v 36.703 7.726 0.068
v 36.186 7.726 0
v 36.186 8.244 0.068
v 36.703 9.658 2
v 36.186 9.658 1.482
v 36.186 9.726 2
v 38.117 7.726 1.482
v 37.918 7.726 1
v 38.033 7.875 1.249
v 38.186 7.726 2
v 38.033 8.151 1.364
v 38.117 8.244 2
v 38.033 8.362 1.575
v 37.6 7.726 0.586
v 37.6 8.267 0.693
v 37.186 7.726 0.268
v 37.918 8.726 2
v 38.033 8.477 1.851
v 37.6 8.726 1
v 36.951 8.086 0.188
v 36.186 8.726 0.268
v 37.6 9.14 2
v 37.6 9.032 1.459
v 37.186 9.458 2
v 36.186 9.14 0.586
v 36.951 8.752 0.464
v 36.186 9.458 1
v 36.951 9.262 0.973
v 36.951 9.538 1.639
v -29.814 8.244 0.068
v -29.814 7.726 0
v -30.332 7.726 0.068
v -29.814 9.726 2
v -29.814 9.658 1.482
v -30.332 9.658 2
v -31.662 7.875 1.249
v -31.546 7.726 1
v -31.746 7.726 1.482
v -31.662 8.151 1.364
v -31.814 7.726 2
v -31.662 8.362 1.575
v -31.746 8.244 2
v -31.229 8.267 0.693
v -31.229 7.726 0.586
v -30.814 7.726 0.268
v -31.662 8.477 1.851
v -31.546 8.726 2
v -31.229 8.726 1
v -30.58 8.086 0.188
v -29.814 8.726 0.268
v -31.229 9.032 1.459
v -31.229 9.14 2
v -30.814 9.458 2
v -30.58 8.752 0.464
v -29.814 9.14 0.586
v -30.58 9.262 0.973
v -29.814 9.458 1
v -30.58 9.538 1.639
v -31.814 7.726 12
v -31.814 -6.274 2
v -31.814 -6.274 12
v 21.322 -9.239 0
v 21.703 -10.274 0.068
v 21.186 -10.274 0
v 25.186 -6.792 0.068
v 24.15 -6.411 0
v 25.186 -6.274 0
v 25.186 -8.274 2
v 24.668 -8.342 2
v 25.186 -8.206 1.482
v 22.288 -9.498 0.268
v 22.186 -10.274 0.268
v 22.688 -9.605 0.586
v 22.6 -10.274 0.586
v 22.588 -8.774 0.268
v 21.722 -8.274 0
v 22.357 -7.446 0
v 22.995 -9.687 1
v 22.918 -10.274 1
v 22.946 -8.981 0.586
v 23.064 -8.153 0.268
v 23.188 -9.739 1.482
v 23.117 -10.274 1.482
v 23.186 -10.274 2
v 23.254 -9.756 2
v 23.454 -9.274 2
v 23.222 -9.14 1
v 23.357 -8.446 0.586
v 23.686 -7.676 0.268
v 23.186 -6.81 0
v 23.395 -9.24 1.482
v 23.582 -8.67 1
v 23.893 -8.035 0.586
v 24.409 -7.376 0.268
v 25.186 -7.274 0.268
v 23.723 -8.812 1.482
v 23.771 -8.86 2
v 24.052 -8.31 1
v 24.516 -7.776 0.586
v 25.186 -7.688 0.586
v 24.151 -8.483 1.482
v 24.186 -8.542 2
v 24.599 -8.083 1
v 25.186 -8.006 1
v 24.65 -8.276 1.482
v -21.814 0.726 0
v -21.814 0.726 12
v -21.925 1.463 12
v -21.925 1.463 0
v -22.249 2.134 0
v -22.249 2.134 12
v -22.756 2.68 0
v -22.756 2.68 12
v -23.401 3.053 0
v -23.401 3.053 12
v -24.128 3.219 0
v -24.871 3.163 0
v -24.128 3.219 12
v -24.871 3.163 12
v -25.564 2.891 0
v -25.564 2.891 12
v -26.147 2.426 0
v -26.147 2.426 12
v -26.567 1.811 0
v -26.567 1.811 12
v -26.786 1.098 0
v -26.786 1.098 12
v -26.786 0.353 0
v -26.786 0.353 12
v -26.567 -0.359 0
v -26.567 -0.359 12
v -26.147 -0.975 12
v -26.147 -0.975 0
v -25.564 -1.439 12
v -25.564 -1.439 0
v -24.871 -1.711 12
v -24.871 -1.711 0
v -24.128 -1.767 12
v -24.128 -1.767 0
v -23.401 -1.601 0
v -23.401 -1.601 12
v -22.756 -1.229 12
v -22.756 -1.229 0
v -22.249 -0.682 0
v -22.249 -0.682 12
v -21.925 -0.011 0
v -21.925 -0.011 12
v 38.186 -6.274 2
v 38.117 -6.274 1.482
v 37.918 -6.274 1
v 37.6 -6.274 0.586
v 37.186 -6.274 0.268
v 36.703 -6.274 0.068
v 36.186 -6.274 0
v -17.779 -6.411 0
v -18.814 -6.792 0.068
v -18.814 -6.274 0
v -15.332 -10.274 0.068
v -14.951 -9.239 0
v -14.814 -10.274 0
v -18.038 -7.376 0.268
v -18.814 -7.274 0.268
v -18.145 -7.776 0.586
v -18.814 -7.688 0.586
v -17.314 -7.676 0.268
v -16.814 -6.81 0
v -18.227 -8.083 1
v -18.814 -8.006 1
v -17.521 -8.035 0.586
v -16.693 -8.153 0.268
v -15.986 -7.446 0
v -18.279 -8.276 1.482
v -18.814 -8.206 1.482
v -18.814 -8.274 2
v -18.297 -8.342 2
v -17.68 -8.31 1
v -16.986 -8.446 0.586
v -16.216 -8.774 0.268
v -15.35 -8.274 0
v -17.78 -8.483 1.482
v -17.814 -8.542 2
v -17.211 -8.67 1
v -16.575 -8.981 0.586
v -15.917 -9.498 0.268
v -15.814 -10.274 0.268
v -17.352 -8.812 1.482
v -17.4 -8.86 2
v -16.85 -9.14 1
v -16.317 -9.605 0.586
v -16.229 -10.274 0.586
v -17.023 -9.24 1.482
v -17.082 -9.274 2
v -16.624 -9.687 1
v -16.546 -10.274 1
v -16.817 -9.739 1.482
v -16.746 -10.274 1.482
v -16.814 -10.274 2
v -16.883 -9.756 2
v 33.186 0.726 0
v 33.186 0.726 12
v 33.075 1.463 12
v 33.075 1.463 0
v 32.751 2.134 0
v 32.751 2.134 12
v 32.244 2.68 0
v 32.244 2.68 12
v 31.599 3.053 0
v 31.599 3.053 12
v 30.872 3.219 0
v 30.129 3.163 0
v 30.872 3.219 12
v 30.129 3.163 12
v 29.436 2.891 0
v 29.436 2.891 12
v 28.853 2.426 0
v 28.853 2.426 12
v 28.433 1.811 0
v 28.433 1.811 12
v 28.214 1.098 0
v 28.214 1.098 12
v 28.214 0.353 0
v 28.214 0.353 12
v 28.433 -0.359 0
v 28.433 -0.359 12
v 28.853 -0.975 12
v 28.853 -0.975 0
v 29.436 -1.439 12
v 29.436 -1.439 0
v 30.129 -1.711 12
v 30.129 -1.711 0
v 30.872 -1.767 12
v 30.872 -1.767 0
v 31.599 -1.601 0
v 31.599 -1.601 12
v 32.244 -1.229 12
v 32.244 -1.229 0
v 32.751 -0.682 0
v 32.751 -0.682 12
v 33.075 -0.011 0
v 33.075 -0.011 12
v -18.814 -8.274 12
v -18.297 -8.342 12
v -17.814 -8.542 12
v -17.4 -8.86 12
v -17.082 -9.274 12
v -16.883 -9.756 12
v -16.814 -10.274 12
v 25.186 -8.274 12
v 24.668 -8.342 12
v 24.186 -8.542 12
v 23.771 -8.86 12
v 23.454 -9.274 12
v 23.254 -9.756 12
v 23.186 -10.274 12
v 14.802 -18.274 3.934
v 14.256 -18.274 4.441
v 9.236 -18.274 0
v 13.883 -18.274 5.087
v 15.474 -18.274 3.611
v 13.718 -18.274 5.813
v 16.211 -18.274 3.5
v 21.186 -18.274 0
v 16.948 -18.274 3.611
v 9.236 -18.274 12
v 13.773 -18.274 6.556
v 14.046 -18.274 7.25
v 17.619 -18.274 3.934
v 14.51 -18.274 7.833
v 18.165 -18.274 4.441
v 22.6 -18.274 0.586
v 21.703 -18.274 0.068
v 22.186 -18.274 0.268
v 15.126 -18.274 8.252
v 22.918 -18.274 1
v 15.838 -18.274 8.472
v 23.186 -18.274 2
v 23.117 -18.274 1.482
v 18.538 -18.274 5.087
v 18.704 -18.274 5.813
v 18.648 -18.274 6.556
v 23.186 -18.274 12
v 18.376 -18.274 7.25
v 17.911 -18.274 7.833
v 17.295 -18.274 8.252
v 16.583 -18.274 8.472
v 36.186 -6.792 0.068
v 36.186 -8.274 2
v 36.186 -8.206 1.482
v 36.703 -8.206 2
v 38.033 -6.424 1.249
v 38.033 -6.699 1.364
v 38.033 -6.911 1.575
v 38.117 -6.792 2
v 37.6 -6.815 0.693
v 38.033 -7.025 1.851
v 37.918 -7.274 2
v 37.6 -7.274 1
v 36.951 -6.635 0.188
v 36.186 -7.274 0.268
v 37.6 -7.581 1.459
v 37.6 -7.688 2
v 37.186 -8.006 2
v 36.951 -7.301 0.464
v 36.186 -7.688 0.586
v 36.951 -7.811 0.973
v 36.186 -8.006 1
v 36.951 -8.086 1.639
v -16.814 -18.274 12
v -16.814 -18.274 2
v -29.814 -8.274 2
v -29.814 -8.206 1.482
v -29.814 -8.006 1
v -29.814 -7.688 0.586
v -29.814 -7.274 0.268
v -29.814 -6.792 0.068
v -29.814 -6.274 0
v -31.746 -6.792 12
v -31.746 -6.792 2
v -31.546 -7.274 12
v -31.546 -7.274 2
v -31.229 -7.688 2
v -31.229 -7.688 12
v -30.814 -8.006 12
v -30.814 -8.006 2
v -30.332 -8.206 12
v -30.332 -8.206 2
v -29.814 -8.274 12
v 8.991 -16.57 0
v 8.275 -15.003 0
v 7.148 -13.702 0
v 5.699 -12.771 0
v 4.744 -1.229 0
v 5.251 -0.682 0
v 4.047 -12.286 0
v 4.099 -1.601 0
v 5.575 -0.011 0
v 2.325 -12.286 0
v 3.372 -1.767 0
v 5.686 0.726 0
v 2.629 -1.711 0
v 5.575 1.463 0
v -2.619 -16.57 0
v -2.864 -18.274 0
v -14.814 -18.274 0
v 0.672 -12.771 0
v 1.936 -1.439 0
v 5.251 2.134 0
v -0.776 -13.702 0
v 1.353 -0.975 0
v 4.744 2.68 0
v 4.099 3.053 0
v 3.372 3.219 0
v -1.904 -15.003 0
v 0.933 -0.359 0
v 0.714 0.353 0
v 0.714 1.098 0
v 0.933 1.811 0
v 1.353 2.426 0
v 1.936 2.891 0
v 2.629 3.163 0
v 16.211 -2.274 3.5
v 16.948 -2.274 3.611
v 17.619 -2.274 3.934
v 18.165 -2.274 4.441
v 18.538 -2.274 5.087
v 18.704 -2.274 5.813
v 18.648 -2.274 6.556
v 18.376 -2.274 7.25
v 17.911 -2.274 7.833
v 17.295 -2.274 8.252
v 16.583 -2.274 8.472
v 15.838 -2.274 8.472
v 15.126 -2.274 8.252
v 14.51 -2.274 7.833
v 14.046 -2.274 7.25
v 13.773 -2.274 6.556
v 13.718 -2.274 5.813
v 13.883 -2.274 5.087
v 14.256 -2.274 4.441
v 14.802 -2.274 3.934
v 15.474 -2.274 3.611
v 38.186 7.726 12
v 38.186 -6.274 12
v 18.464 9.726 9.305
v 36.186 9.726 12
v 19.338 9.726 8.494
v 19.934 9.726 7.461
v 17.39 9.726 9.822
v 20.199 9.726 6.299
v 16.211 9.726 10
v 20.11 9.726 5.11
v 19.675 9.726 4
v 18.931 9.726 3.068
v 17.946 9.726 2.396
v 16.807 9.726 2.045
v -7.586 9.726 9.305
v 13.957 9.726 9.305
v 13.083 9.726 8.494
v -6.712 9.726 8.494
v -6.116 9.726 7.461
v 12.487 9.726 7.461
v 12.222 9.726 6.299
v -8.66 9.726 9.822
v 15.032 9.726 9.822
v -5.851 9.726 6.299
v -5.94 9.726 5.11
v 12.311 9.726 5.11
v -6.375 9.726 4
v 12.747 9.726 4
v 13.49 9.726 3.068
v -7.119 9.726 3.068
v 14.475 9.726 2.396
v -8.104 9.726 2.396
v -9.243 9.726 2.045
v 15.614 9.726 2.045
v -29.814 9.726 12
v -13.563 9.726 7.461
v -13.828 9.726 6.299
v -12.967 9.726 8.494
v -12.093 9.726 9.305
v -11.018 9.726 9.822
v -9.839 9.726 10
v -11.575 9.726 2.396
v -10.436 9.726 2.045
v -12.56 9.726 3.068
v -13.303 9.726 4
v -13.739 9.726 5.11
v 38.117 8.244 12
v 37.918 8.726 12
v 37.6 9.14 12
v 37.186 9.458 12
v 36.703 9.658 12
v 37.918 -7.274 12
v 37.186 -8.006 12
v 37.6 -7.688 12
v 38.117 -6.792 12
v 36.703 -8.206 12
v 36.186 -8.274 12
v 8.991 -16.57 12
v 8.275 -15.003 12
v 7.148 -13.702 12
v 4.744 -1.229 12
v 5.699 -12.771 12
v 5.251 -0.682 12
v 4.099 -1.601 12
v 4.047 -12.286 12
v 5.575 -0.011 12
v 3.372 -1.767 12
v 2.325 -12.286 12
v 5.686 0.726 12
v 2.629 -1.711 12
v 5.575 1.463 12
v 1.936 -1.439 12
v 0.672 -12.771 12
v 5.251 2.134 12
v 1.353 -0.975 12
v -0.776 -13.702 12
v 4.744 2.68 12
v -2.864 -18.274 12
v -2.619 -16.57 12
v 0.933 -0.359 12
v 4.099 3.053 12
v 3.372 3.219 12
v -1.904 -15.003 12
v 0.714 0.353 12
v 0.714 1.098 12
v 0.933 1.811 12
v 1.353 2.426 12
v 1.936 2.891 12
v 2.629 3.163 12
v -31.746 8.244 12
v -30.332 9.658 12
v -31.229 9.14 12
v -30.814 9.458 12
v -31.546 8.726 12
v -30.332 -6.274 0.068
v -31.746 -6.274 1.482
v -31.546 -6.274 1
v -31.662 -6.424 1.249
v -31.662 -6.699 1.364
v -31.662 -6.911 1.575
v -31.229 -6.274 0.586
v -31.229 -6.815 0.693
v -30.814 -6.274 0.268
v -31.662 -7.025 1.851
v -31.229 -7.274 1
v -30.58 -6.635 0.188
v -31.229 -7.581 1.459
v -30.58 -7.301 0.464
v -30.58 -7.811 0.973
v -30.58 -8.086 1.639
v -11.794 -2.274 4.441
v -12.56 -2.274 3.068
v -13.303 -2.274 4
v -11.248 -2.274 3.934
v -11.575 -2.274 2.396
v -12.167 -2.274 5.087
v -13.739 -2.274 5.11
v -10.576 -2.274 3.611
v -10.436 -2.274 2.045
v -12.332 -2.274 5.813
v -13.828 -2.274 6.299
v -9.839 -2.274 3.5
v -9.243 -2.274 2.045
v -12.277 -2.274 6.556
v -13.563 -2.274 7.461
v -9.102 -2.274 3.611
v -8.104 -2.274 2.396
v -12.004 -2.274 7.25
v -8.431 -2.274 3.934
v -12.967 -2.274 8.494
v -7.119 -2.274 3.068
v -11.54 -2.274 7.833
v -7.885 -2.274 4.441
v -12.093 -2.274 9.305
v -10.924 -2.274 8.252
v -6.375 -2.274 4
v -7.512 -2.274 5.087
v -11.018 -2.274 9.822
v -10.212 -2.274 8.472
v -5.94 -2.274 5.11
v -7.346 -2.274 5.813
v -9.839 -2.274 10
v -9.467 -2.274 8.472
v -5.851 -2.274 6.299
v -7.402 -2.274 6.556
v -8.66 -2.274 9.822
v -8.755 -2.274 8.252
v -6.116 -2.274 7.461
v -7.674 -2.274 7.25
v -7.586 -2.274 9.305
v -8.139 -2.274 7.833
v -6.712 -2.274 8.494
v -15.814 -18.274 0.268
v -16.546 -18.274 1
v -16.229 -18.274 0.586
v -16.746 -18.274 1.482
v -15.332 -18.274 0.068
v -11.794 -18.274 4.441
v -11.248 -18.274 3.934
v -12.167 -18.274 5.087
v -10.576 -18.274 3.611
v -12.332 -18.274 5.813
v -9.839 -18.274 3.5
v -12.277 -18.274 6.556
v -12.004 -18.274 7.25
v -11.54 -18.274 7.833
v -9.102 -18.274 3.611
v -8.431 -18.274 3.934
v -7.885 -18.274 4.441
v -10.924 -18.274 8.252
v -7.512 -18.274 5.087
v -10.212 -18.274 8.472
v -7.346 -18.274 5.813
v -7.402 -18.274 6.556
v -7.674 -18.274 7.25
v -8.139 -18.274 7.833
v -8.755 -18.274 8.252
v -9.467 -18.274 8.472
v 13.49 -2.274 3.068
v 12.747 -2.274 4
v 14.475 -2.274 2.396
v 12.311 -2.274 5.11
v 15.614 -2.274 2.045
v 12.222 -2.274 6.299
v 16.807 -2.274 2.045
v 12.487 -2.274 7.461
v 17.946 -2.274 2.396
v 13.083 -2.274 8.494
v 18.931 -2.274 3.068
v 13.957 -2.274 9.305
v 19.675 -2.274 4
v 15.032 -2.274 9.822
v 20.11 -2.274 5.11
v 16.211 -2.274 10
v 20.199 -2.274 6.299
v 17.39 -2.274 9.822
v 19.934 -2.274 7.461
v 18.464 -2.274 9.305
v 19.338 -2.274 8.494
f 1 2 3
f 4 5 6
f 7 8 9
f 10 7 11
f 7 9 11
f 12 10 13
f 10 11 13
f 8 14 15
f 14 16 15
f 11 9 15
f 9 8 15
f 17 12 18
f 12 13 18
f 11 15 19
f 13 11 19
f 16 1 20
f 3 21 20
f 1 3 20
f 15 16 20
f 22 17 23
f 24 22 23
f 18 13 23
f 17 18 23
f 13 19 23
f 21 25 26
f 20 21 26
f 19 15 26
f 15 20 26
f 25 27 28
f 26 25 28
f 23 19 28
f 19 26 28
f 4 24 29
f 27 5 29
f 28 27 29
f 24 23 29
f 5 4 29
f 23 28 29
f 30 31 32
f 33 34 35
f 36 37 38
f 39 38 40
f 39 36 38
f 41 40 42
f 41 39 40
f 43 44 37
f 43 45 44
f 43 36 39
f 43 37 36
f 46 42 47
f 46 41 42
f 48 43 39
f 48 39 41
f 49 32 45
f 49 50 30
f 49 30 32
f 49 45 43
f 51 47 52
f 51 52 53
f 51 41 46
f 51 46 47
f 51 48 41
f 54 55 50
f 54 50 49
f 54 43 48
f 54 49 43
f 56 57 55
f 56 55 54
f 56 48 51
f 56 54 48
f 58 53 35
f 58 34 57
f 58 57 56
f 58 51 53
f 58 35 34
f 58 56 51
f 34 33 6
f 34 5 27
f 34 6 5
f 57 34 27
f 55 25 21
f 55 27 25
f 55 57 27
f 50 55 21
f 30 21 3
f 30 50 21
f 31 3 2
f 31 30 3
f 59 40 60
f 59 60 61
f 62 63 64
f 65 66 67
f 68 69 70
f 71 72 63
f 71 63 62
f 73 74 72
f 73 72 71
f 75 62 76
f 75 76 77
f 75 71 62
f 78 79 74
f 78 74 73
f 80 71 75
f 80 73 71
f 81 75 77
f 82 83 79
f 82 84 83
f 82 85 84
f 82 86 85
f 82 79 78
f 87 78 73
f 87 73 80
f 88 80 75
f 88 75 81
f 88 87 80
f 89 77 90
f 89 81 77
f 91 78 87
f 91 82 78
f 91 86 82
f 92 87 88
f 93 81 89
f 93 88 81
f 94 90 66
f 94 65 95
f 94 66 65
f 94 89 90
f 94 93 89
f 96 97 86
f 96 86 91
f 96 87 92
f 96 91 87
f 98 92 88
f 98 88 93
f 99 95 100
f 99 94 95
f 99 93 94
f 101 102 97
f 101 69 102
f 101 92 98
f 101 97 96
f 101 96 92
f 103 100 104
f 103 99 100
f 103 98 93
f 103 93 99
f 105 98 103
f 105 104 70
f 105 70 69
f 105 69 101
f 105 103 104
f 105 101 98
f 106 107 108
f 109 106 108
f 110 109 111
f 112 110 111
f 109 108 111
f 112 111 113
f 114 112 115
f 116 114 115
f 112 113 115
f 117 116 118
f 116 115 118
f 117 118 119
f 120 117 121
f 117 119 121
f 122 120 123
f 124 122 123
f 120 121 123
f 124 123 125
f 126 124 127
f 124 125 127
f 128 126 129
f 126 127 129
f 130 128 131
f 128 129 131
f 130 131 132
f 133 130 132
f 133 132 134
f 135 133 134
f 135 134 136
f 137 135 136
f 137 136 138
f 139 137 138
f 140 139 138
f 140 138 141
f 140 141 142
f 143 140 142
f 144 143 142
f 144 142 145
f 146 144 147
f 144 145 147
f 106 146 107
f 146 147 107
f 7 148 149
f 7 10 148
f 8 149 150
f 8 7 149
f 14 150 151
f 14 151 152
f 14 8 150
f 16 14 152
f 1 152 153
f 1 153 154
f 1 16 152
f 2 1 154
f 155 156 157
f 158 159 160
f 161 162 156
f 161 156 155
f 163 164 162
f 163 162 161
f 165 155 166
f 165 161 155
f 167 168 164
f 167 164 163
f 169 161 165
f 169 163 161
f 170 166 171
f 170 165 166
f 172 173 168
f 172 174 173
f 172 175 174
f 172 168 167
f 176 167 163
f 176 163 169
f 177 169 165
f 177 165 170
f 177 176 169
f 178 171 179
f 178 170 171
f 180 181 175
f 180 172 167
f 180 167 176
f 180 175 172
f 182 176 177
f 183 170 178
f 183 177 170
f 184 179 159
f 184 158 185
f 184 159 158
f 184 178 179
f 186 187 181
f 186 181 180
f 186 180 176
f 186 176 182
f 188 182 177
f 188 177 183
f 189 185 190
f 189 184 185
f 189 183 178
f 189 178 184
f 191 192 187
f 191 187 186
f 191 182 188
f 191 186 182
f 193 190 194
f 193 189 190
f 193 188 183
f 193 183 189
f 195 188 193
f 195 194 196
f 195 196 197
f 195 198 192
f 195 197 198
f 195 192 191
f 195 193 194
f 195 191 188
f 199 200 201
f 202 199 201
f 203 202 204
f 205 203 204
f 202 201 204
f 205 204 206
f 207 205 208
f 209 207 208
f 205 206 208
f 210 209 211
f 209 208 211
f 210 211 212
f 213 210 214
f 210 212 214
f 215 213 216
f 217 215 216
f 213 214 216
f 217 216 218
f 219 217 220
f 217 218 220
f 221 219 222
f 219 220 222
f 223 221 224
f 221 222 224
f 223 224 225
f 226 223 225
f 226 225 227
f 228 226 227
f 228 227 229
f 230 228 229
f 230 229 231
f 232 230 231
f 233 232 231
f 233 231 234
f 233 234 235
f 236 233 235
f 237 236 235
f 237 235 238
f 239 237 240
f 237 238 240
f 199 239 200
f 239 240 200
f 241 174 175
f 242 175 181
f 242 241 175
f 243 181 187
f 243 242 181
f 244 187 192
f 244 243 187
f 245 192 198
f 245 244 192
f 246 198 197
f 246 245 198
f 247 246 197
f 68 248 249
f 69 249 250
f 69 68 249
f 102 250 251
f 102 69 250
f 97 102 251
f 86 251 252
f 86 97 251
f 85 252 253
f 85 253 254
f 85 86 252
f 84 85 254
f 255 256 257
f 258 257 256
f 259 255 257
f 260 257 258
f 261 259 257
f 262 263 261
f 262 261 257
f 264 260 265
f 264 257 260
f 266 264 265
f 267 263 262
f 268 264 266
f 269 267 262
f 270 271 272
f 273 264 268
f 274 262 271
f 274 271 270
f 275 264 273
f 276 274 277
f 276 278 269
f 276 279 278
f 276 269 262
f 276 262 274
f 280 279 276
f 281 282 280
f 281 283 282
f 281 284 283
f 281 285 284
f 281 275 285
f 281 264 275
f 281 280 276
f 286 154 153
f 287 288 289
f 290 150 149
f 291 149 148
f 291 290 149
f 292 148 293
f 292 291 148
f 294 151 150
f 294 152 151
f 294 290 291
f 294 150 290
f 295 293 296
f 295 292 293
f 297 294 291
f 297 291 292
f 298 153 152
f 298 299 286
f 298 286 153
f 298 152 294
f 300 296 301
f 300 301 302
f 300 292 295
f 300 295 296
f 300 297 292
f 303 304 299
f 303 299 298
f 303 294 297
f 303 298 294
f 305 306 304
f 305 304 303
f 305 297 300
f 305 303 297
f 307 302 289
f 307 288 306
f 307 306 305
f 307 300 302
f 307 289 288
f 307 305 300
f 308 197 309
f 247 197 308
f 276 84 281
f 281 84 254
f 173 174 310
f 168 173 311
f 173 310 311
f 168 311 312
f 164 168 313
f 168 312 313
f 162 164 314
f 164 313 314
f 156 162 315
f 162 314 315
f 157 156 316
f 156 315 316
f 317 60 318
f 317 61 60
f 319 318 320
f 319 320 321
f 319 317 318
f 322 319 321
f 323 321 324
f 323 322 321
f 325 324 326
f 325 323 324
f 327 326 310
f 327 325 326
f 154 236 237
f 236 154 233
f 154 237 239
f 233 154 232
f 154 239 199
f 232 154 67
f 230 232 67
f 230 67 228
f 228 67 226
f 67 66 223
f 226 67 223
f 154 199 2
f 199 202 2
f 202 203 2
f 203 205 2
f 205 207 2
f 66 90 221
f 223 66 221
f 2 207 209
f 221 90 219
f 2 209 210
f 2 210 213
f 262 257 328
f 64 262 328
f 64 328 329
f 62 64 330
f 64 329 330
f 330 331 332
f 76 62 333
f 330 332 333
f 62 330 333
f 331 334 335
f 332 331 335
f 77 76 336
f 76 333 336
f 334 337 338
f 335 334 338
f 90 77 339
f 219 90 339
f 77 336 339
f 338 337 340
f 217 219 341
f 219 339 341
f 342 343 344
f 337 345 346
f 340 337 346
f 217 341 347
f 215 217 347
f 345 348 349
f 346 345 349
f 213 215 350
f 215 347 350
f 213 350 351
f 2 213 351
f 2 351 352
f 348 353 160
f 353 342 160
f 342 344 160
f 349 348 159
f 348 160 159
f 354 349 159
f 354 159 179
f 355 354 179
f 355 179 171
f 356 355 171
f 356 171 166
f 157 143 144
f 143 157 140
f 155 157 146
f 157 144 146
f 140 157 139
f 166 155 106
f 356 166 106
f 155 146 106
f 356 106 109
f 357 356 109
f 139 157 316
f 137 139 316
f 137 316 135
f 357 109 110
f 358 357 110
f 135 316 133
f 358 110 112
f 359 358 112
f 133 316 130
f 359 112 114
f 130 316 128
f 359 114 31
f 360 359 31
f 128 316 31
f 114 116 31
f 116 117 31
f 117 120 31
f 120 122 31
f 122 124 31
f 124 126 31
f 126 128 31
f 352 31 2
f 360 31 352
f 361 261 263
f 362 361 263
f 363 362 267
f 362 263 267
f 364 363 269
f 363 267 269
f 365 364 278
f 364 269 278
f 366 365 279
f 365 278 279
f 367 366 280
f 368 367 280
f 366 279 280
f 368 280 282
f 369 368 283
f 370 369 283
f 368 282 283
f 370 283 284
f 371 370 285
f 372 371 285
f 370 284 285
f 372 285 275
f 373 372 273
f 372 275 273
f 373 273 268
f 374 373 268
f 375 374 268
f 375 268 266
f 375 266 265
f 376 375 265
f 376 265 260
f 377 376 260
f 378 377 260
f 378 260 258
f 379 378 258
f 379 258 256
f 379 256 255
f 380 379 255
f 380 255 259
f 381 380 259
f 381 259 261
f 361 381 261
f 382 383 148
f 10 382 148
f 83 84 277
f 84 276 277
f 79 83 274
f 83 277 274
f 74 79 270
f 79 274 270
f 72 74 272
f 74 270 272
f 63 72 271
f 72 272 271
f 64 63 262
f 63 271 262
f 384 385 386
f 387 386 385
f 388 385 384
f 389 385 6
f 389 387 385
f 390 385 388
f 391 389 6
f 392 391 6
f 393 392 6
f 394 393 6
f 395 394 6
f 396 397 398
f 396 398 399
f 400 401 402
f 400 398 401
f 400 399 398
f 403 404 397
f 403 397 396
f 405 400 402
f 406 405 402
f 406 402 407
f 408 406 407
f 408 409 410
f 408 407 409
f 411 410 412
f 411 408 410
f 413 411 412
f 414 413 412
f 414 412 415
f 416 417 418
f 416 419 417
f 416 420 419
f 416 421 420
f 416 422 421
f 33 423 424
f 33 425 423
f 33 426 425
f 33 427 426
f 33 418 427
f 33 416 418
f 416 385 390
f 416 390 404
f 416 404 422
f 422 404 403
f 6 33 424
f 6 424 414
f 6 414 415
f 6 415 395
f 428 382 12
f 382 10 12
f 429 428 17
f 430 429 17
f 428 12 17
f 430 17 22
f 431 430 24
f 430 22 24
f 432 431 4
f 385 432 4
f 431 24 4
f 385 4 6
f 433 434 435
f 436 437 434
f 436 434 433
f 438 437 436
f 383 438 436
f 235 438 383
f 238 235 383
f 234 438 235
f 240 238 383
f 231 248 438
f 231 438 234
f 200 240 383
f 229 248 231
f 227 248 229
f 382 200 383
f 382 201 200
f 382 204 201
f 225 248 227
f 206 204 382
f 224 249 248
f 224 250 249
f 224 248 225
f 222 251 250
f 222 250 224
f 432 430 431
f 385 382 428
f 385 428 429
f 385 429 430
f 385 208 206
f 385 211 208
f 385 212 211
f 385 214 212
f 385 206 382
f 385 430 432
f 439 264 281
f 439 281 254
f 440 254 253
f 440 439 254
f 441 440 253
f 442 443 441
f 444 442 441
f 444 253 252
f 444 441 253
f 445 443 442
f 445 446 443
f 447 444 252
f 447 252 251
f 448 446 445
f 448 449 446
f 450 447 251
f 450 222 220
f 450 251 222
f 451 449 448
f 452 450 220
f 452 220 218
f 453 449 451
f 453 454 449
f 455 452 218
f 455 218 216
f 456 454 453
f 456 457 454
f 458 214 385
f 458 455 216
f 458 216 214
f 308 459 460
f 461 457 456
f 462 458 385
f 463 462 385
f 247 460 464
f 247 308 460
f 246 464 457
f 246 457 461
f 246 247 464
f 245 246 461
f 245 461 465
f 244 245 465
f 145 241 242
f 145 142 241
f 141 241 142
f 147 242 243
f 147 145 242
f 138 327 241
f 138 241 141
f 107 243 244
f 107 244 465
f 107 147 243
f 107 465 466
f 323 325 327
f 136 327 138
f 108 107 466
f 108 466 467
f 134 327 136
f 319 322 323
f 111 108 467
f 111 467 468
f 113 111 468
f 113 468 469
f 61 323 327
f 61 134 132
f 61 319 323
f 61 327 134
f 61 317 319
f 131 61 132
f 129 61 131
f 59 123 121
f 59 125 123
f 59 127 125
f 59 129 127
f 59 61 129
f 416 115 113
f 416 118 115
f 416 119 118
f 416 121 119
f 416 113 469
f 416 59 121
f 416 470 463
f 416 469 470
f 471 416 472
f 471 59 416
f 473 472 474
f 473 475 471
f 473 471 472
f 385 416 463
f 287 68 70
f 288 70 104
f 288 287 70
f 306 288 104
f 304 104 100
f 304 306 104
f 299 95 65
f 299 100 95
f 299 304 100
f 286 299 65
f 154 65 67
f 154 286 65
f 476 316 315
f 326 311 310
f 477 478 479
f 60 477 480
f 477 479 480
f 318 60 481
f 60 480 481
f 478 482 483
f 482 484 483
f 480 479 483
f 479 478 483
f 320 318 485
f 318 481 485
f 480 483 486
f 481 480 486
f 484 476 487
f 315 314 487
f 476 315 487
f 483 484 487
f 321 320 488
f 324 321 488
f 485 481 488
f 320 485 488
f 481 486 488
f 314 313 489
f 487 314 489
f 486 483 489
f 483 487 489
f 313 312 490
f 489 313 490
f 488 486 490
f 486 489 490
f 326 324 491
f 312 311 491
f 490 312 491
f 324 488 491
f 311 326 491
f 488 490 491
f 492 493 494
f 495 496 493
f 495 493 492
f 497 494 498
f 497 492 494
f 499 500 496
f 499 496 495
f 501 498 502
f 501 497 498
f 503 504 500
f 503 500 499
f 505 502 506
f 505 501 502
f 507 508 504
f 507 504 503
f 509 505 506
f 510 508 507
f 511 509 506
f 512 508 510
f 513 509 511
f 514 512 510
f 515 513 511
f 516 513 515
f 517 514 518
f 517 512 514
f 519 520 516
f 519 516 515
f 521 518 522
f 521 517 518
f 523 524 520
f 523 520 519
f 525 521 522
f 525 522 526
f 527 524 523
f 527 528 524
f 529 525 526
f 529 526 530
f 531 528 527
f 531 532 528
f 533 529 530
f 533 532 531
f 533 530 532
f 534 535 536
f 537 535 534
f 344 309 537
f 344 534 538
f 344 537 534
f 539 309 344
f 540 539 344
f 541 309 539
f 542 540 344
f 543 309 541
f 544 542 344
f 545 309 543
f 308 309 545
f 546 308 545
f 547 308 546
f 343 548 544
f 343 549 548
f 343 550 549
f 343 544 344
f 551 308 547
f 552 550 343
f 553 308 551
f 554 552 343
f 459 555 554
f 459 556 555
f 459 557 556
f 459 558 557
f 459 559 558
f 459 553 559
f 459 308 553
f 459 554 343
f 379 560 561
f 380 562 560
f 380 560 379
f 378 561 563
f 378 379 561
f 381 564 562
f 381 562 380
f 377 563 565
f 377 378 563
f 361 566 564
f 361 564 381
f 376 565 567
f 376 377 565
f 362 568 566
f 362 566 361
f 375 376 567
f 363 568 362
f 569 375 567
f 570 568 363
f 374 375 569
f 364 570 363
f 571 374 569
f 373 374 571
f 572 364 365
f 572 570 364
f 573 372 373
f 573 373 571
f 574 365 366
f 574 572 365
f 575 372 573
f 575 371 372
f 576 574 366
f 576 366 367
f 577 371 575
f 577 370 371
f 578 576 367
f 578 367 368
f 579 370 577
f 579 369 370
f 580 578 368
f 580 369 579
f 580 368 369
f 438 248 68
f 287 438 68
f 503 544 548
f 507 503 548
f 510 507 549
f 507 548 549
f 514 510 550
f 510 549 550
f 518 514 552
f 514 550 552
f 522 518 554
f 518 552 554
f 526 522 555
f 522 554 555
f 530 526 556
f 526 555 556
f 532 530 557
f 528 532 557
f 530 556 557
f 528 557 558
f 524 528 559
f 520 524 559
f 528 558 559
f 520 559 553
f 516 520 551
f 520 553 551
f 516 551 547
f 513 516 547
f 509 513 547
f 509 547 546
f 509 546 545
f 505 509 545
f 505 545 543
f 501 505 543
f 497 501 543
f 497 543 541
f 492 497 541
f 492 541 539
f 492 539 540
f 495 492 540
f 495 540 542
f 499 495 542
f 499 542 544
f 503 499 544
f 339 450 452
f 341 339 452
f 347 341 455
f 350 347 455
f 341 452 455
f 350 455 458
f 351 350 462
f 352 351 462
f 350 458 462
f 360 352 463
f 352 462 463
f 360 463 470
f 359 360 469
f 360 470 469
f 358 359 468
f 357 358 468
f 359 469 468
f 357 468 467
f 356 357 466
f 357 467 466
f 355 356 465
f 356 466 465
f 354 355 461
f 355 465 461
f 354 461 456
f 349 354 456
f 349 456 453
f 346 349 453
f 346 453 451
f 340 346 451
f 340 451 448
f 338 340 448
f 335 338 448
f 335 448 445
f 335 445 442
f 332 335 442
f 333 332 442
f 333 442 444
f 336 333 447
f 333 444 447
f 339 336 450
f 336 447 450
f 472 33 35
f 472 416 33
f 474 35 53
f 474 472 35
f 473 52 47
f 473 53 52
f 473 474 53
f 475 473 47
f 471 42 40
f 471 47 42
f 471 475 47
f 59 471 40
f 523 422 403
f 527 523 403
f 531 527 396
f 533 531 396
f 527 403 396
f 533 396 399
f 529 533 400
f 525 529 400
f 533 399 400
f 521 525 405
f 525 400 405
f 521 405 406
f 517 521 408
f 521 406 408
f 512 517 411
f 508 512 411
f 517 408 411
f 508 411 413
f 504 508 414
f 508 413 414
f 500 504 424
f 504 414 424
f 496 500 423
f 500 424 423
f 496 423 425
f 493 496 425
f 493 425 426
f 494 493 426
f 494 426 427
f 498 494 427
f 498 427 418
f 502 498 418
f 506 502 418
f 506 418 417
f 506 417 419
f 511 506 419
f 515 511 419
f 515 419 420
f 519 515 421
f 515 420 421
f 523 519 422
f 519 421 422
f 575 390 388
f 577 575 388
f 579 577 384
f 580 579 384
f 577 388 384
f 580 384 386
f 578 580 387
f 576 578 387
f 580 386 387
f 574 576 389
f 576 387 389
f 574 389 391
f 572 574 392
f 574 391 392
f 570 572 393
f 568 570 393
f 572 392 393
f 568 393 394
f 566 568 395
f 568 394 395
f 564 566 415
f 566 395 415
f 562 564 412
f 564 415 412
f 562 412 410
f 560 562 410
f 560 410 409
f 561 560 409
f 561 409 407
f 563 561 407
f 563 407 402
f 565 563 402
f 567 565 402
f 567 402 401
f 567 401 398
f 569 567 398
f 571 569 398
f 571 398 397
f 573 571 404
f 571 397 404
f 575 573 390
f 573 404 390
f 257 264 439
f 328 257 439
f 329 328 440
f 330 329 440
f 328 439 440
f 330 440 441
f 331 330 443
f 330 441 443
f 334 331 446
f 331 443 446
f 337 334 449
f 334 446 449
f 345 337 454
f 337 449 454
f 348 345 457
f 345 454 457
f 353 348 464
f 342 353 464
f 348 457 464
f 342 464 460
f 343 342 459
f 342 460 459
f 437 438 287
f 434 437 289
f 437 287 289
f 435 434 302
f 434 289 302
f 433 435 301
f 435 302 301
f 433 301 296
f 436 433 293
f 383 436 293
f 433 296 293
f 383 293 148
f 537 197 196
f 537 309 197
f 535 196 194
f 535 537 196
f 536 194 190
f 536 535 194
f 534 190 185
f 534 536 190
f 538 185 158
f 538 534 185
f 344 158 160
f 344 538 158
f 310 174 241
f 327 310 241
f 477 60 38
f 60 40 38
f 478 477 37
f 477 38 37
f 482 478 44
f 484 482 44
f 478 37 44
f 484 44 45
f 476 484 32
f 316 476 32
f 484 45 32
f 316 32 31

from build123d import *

# Parameters (mm, degrees)
ESQUISSE1_W             = 40
ESQUISSE1_H             = 18
BOSS_EXTRU_1_DEPTH      = 12
ESQUISSE2_W             = 40
ESQUISSE2_H             = 12
BOSS_EXTRU_2_DEPTH      = 10
ENL_V_MAT_EXTRU_1_DEPTH = 12
ESQUISSE4_R             = 2.5
ENL_V_MAT_EXTRU_2_DEPTH = 28
ESQUISSE5_R             = 2.5
ENL_V_MAT_EXTRU_3_DEPTH = 12
ESQUISSE6_R             = 4
ENL_V_MAT_EXTRU_5_DEPTH = 12
ESQUISSE7_W             = 12
ESQUISSE7_H             = 18
BOSS_EXTRU_3_DEPTH      = 15
ESQUISSE8_W             = 12
ESQUISSE8_H             = 18
BOSS_EXTRU_4_DEPTH      = 15
ESQUISSE9_R             = 2.5
ENL_V_MAT_EXTRU_6_DEPTH = 12
CONG_1_R                = 2


with BuildPart() as part:
    # Esquisse1 → Boss.-Extru.1 (new body)
    with BuildSketch(Plane.XY):
        with Locations((3.185612757, 0.725848564)):
            Rectangle(ESQUISSE1_W, ESQUISSE1_H)
    extrude(amount=BOSS_EXTRU_1_DEPTH)

    # Esquisse2 → Boss.-Extru.2 (add)
    with BuildSketch(Plane.XZ.offset(8.274151436)):
        with Locations((3.185612757, 6)):
            Rectangle(ESQUISSE2_W, ESQUISSE2_H)
    extrude(amount=BOSS_EXTRU_2_DEPTH)

    # Esquisse3 → Enlèv. mat.-Extru.1 (cut)
    with BuildSketch(Plane.XY.offset(12)):
        with BuildLine():
            Line((-2.864387243, -18.274151436), (9.235612757, -18.274151436))
            ThreePointArc((9.235612757, -18.274151436), (3.185612757, -12.224151436), (-2.864387243, -18.274151436))
        make_face()
    extrude(amount=-ENL_V_MAT_EXTRU_1_DEPTH, mode=Mode.SUBTRACT)

    # Esquisse4 → Enlèv. mat.-Extru.2 (cut)
    with BuildSketch(Plane.XZ.offset(18.274151436)):
        with Locations(Location((-9.839387243, 6, 0), (0, 0, 270))):
            Circle(ESQUISSE4_R)
        with Locations(Location((16.210612757, 6, 0), (0, 0, 270))):
            Circle(ESQUISSE4_R)
    extrude(amount=-ENL_V_MAT_EXTRU_2_DEPTH, mode=Mode.SUBTRACT)

    # Esquisse5 → Enlèv. mat.-Extru.3 (cut)
    with BuildSketch(Plane.XY.offset(12)):
        with Locations((3.185612757, 0.725848564)):
            Circle(ESQUISSE5_R)
    extrude(amount=-ENL_V_MAT_EXTRU_3_DEPTH, mode=Mode.SUBTRACT)

    # Esquisse6 → Enlèv. mat.-Extru.5 (cut)
    with BuildSketch(Plane(origin=(0, 9.725848564, 0), x_dir=(1, 0, 0), z_dir=(0, 1, 0))):
        with Locations(Location((16.210612757, -6, 0), (0, 0, 270))):
            Circle(ESQUISSE6_R)
        with Locations(Location((-9.839387243, -6, 0), (0, 0, 270))):
            Circle(ESQUISSE6_R)
    extrude(amount=-ENL_V_MAT_EXTRU_5_DEPTH, mode=Mode.SUBTRACT)

    # Esquisse7 → Boss.-Extru.3 (add)
    with BuildSketch(Plane.ZY.offset(16.814387243)):
        with Locations((6, 0.725848564)):
            Rectangle(ESQUISSE7_W, ESQUISSE7_H)
    extrude(amount=BOSS_EXTRU_3_DEPTH)

    # Esquisse8 → Boss.-Extru.4 (add)
    with BuildSketch(Plane(origin=(23.185612757, 0, 0), x_dir=(0, 0, -1), z_dir=(1, 0, 0))):
        with Locations((-6, 0.725848564)):
            Rectangle(ESQUISSE8_W, ESQUISSE8_H)
    extrude(amount=BOSS_EXTRU_4_DEPTH)

    # Esquisse9 → Enlèv. mat.-Extru.6 (cut)
    with BuildSketch(Plane.XY.offset(12)):
        with Locations((-24.314387243, 0.725848564)):
            Circle(ESQUISSE9_R)
        with Locations((30.685612757, 0.725848564)):
            Circle(ESQUISSE9_R)
    extrude(amount=-ENL_V_MAT_EXTRU_6_DEPTH, mode=Mode.SUBTRACT)

    # Congé1
    cong_1_edges = [part.edges().sort_by_distance(p)[0] for p in [
        (3.185612757, 9.725848564, 0),
        (23.185612757, -13.274151436, 0),
        (-16.814387243, -13.274151436, 0),
        (-16.814387243, -8.274151436, 6),
        (-24.314387243, -8.274151436, 0),
        (-31.814387243, 0.725848564, 0),
        (-31.814387243, -8.274151436, 6),
        (-31.814387243, 9.725848564, 6),
        (30.685612757, -8.274151436, 0),
        (23.185612757, -8.274151436, 6),
        (38.185612757, 0.725848564, 0),
        (38.185612757, 9.725848564, 6),
        (38.185612757, -8.274151436, 6),
    ]]
    fillet(cong_1_edges, radius=CONG_1_R - 0.0001)  # a hair under: the kernel refuses the full size


solid = part.part
